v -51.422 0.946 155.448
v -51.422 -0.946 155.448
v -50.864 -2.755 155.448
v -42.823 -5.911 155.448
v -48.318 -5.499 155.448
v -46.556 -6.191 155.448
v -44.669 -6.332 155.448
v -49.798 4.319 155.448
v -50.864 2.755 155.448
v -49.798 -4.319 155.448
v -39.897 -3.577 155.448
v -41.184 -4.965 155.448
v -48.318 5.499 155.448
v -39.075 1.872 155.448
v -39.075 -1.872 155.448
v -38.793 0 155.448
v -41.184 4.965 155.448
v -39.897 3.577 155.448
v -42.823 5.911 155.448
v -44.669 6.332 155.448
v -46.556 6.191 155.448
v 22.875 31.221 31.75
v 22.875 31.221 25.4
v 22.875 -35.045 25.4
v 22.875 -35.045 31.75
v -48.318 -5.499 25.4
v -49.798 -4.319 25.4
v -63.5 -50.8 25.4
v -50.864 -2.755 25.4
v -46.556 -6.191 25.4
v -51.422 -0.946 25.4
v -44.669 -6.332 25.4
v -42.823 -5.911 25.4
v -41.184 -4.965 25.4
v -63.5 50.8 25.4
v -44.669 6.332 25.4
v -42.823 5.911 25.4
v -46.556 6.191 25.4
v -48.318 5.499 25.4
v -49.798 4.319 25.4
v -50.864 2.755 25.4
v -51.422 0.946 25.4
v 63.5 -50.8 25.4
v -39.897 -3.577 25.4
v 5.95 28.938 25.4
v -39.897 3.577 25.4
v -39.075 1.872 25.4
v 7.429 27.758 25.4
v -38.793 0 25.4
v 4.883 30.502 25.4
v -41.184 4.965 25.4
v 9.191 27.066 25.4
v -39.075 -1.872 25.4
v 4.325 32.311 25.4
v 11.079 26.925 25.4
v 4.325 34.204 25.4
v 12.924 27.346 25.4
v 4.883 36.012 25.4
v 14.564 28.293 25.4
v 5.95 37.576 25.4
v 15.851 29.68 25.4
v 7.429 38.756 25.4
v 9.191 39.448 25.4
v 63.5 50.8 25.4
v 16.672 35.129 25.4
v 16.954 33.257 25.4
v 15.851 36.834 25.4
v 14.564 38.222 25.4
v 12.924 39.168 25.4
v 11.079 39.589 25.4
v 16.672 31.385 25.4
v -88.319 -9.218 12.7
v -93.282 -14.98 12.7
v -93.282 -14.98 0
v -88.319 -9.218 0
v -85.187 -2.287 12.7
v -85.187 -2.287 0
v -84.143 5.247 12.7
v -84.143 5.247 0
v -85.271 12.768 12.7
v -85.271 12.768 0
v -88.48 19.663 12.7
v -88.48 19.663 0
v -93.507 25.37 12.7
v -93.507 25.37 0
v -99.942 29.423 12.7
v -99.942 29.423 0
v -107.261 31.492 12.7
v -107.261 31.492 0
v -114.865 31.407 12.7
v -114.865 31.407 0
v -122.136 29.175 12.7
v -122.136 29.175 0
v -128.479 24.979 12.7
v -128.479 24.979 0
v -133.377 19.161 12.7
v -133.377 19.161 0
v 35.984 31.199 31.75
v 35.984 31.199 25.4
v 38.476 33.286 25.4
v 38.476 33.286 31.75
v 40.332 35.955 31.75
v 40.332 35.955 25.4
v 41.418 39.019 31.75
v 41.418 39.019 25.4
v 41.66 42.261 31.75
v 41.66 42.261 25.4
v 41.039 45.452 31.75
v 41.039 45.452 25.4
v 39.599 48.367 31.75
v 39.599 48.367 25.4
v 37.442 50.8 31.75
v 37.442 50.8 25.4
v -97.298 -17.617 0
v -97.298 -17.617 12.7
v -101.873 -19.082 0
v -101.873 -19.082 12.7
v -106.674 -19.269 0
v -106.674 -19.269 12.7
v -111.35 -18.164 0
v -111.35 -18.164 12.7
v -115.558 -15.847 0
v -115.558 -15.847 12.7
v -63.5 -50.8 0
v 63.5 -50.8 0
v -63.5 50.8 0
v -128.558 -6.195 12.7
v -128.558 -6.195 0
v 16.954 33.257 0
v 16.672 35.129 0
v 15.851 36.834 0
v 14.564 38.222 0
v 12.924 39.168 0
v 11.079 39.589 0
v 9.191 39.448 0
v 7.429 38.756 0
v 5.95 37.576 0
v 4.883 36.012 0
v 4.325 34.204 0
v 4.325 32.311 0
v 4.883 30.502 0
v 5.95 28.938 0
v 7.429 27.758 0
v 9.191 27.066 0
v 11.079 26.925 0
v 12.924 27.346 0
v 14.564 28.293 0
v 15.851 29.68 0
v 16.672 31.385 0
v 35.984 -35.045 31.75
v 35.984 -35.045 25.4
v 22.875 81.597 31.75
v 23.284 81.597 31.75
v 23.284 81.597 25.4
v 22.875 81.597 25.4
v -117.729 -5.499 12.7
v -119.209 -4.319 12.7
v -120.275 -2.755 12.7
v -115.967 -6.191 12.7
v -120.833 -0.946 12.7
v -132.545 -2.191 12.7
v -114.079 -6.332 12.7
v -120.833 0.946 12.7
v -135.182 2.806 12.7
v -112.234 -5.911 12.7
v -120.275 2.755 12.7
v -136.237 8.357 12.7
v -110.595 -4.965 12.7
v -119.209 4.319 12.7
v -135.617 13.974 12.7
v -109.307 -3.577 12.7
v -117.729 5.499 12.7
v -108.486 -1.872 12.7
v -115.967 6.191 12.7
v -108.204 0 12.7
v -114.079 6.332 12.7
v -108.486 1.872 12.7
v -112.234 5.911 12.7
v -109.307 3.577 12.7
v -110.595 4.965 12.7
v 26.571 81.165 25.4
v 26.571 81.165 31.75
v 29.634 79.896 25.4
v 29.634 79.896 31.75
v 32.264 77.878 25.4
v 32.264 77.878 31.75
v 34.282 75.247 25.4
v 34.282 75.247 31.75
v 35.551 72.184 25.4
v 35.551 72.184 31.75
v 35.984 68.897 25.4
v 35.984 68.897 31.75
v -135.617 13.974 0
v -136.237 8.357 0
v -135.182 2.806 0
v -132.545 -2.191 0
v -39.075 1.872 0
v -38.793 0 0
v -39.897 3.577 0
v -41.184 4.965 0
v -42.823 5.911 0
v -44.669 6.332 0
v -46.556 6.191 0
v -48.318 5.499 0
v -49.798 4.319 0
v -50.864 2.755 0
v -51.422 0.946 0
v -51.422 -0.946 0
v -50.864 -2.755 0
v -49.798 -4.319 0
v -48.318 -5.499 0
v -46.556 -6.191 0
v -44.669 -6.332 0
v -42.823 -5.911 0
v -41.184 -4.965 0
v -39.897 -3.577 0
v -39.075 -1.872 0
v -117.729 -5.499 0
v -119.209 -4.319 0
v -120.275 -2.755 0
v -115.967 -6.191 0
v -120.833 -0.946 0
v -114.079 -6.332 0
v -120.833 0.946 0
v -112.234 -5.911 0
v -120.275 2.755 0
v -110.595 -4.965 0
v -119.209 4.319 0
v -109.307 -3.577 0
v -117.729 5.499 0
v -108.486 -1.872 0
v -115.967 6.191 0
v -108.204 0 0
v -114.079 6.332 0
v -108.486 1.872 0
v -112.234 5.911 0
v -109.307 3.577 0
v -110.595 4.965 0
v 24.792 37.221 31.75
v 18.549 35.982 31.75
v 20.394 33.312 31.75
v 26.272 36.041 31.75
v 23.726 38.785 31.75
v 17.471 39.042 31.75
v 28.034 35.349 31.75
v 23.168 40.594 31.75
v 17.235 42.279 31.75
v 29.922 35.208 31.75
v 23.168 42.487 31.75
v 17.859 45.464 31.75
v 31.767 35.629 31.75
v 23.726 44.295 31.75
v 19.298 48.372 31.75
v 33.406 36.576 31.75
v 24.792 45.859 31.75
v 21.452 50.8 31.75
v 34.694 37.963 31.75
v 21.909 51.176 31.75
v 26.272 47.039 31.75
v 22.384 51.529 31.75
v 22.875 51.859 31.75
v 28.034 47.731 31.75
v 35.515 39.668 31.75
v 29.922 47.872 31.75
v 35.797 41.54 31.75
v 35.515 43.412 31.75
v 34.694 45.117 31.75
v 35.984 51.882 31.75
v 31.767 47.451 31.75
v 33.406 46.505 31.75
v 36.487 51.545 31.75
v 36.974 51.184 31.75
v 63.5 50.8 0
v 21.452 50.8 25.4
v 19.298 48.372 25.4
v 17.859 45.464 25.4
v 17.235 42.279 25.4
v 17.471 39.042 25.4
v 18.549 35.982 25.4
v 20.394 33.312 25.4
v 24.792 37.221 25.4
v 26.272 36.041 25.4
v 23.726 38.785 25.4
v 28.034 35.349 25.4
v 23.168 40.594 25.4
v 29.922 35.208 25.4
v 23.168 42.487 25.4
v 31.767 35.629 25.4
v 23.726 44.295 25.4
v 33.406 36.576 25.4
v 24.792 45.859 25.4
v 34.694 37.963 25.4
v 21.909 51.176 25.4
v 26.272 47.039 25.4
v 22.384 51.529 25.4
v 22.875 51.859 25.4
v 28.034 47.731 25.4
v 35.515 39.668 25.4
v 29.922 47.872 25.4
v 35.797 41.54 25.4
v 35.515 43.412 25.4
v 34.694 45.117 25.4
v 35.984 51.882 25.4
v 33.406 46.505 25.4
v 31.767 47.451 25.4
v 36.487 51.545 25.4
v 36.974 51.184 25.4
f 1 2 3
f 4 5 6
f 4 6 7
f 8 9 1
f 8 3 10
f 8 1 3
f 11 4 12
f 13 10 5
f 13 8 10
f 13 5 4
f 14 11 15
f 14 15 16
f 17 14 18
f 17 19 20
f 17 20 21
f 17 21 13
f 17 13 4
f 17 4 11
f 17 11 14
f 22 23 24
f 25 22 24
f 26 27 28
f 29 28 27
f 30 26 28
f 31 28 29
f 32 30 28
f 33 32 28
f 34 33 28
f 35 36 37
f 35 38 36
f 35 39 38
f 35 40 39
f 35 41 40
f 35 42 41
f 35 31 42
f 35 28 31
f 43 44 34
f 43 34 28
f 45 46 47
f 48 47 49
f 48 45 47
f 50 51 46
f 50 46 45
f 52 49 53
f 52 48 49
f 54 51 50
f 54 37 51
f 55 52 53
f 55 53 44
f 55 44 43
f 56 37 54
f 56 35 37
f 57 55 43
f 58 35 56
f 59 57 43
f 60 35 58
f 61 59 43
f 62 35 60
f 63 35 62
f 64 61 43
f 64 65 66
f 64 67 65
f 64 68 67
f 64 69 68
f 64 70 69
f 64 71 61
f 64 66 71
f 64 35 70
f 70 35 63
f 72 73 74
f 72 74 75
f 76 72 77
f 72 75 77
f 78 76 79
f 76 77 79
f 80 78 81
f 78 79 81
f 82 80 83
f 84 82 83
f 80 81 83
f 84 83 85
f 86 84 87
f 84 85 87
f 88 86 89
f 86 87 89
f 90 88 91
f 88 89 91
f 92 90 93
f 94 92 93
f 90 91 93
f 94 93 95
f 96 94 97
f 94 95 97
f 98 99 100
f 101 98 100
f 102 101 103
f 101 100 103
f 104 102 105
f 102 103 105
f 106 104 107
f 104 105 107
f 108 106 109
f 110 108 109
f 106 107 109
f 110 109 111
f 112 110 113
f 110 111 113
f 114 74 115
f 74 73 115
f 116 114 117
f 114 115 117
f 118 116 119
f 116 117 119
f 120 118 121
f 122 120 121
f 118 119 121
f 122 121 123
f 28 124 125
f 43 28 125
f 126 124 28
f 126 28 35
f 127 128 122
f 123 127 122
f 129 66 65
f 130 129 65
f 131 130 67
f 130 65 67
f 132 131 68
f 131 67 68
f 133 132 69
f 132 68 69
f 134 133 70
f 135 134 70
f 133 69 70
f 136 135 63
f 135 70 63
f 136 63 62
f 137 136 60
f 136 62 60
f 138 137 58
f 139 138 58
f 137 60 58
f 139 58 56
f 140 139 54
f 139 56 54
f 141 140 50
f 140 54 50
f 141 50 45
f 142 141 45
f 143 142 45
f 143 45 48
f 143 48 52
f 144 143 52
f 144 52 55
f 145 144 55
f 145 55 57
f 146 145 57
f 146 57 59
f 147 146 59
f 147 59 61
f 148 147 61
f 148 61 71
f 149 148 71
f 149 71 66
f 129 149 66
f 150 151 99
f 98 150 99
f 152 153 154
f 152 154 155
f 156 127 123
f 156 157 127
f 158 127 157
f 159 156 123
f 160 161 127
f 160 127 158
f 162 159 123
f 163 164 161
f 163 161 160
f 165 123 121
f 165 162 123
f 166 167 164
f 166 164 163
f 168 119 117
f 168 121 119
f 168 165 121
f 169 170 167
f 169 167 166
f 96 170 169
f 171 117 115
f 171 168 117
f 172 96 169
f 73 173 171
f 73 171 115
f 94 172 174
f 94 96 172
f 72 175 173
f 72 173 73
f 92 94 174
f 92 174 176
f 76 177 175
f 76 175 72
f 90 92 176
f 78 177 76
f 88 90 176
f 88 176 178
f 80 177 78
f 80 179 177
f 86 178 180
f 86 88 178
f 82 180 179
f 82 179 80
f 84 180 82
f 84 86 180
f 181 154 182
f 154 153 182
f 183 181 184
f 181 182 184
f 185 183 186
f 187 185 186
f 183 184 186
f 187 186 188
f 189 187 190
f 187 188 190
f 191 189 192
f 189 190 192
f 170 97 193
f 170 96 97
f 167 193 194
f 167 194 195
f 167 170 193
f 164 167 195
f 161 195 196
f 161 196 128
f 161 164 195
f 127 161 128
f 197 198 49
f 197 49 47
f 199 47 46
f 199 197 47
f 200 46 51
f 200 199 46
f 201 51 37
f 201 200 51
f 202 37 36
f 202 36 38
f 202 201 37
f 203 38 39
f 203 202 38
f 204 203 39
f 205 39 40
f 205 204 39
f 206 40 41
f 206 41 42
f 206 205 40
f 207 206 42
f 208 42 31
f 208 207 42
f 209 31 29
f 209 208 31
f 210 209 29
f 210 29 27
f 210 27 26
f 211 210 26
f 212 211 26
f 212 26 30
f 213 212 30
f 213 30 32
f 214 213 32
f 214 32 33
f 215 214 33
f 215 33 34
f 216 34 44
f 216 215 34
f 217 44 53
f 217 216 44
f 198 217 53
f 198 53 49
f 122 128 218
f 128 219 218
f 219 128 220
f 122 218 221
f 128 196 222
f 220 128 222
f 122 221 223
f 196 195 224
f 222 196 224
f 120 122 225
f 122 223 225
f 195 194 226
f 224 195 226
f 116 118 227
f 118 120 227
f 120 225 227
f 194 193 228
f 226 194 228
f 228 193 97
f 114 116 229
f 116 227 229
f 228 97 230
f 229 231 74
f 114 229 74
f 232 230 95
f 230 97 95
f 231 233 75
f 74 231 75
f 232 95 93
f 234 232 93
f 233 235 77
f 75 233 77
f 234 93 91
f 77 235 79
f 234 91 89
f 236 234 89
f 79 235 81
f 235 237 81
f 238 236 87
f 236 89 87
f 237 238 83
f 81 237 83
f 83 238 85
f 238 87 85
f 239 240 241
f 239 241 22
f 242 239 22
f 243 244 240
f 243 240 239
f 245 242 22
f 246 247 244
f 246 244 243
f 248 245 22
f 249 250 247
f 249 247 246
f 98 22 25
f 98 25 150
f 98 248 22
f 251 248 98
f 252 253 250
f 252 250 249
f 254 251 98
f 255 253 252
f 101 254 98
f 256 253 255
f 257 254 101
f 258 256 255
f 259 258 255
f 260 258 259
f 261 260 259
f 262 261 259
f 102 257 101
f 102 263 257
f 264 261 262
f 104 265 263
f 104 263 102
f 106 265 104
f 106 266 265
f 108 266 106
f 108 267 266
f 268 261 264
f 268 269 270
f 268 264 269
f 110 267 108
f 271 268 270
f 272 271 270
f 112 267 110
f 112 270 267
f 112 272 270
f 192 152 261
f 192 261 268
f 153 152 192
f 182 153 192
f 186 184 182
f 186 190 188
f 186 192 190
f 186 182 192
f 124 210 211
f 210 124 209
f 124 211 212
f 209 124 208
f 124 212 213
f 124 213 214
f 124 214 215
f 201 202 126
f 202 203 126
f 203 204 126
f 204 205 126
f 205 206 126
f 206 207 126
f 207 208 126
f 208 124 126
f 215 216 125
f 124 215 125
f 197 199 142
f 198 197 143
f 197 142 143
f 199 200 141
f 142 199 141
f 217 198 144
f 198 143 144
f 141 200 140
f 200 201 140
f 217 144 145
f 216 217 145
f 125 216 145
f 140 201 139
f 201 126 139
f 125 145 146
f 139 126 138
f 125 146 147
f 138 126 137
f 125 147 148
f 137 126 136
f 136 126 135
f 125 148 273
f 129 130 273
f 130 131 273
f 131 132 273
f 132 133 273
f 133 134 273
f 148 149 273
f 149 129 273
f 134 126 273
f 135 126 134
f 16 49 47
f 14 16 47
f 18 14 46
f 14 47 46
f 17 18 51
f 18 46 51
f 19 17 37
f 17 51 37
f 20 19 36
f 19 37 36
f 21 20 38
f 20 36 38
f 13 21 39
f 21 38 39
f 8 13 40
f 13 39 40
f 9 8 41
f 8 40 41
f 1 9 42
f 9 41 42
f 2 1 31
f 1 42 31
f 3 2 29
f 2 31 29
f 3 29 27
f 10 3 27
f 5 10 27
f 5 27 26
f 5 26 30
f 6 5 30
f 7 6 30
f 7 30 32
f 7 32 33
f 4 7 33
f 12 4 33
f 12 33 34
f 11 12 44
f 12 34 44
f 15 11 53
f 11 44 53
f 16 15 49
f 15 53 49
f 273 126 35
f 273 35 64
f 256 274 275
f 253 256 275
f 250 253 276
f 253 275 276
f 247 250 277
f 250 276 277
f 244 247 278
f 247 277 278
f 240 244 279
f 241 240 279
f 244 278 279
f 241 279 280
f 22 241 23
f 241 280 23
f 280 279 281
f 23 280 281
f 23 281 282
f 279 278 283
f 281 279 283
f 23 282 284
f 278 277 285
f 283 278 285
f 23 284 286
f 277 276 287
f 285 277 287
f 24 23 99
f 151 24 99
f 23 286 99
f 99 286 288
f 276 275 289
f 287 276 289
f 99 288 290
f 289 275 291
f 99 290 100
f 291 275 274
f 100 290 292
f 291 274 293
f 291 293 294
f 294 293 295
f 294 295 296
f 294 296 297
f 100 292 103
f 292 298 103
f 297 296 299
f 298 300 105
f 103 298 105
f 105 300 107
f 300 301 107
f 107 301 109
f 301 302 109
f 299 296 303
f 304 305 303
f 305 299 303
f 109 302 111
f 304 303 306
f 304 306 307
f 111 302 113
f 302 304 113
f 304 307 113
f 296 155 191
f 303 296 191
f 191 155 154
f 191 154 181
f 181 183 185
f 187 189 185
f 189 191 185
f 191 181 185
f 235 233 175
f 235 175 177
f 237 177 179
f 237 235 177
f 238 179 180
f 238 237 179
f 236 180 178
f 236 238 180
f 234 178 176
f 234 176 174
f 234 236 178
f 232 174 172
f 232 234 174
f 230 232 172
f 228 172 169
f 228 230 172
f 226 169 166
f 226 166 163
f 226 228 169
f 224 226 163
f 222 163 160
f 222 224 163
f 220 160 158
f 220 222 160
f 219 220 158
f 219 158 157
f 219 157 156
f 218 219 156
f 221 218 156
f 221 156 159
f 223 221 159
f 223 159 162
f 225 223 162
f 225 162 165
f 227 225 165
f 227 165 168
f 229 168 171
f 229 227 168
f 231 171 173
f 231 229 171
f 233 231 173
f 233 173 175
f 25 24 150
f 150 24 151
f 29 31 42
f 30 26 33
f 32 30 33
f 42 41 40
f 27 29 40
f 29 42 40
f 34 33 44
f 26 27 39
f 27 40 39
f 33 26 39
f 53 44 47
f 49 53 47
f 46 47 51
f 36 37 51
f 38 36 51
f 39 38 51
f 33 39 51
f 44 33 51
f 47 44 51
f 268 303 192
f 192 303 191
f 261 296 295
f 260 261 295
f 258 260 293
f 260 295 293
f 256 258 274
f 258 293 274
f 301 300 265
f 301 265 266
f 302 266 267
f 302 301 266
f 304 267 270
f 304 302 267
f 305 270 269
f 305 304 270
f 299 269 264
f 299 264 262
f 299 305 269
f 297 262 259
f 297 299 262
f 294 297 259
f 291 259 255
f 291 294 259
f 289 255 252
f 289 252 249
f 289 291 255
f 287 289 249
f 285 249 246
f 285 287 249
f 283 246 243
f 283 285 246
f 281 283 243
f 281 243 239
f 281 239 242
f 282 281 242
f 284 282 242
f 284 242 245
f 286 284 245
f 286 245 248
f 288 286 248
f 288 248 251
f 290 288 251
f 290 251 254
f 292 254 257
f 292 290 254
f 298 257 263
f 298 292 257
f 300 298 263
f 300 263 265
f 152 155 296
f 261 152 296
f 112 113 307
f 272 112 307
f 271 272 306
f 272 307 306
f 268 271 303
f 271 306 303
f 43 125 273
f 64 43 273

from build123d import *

# Parameters (mm, degrees)
F0_W      = 127
F0_H      = 101.6
F0_R      = 6.35
F1_DEPTH  = 25.4
F2_R      = 6.35
F3_DEPTH  = 130.048
F4_R      = 6.35
F5_DEPTH  = 12.7
F6_R      = 19.05
F7_R      = 17.78
F8_R      = 6.35
F9_DEPTH  = 137.922
F10_R     = 6.35
F11_DEPTH = 6.35
F12_R     = 12.7


with BuildPart() as f1:
    # F0 (on Top) → F1 (new body)
    with BuildSketch(Plane.XY):
        Rectangle(F0_W, F0_H)
        with Locations((-45.1431944966, 0)):
            Circle(F0_R, mode=Mode.SUBTRACT)
    extrude(amount=F1_DEPTH)

    # F8 (on face) → F9 (cut)
    with BuildSketch(Plane.XY.offset(25.4)):
        with Locations((10.6044970453, 33.257137984)):
            Circle(F8_R)
    extrude(amount=-F9_DEPTH, mode=Mode.SUBTRACT)


with BuildPart() as f3:
    # F2 (on face) → F3 (new body)
    with BuildSketch(Plane.XY.offset(25.4)):
        with Locations((-45.1431944966, 0)):
            Circle(F2_R)
    extrude(amount=F3_DEPTH)


with BuildPart() as f5:
    # F4 (on Top) → F5 (new body)
    with BuildSketch(Plane.XY):
        with BuildLine():
            ThreePointArc((-108.090634243, -21.3923586225), (-94.8955793472, 26.4752985002), (-136.9013008795, 0))
            Line((-136.9013008795, 0), (-108.090634243, -21.3923586225))
        make_face()
        with Locations((-114.5538915724, 0)):
            Circle(F4_R, mode=Mode.SUBTRACT)
    extrude(amount=F5_DEPTH)

    # F6
    f6_edges = [f5.edges().sort_by_distance(p)[0] for p in [
        (-136.901301, 0, 6.35),
    ]]
    fillet(f6_edges, radius=F6_R)

    # F7
    f7_edges = [f5.edges().sort_by_distance(p)[0] for p in [
        (-108.090634, -21.392359, 6.35),
    ]]
    fillet(f7_edges, radius=F7_R)


with BuildPart() as f11:
    # F10 (on face) → F11 (new body)
    with BuildSketch(Plane.XY.offset(25.4)):
        with BuildLine():
            Line((35.9835483276, 81.5974065338), (22.8754119955, 81.5974065338))
            Line((22.8754119955, 81.5974065338), (22.8754119955, 51.8593189565))
            ThreePointArc((22.8754119955, 51.8593189565), (22.1442782459, 51.3555103512), (21.4516109951, 50.8))
            Line((21.4516109951, 50.8), (37.442334073, 50.8))
            ThreePointArc((37.442334073, 50.8), (36.7330359031, 51.3678620223), (35.9835483276, 51.8815151585))
            Line((35.9835483276, 51.8815151585), (35.9835483276, 81.5974065338))
        make_face()
        with BuildLine():
            Line((37.442334073, 50.8), (21.4516109951, 50.8))
            ThreePointArc((21.4516109951, 50.8), (17.2452085424, 40.6528404263), (22.8754119955, 31.2210071959))
            Line((22.8754119955, 31.2210071959), (22.8754119955, -35.0446995583))
            Line((22.8754119955, -35.0446995583), (35.9835483276, -35.0446995583))
            Line((35.9835483276, -35.0446995583), (35.9835483276, 31.198810994))
            ThreePointArc((35.9835483276, 31.198810994), (41.6472165181, 40.6321802998), (37.442334073, 50.8))
        make_face()
        with Locations((29.4469725341, 41.5401630762)):
            Circle(F10_R, mode=Mode.SUBTRACT)
    extrude(amount=F11_DEPTH)

    # F12
    f12_edges = [f11.edges().sort_by_distance(p)[0] for p in [
        (35.983548, 81.597407, 28.575),
    ]]
    fillet(f12_edges, radius=F12_R)


solid = Compound([f1.part, f3.part, f5.part, f11.part])
